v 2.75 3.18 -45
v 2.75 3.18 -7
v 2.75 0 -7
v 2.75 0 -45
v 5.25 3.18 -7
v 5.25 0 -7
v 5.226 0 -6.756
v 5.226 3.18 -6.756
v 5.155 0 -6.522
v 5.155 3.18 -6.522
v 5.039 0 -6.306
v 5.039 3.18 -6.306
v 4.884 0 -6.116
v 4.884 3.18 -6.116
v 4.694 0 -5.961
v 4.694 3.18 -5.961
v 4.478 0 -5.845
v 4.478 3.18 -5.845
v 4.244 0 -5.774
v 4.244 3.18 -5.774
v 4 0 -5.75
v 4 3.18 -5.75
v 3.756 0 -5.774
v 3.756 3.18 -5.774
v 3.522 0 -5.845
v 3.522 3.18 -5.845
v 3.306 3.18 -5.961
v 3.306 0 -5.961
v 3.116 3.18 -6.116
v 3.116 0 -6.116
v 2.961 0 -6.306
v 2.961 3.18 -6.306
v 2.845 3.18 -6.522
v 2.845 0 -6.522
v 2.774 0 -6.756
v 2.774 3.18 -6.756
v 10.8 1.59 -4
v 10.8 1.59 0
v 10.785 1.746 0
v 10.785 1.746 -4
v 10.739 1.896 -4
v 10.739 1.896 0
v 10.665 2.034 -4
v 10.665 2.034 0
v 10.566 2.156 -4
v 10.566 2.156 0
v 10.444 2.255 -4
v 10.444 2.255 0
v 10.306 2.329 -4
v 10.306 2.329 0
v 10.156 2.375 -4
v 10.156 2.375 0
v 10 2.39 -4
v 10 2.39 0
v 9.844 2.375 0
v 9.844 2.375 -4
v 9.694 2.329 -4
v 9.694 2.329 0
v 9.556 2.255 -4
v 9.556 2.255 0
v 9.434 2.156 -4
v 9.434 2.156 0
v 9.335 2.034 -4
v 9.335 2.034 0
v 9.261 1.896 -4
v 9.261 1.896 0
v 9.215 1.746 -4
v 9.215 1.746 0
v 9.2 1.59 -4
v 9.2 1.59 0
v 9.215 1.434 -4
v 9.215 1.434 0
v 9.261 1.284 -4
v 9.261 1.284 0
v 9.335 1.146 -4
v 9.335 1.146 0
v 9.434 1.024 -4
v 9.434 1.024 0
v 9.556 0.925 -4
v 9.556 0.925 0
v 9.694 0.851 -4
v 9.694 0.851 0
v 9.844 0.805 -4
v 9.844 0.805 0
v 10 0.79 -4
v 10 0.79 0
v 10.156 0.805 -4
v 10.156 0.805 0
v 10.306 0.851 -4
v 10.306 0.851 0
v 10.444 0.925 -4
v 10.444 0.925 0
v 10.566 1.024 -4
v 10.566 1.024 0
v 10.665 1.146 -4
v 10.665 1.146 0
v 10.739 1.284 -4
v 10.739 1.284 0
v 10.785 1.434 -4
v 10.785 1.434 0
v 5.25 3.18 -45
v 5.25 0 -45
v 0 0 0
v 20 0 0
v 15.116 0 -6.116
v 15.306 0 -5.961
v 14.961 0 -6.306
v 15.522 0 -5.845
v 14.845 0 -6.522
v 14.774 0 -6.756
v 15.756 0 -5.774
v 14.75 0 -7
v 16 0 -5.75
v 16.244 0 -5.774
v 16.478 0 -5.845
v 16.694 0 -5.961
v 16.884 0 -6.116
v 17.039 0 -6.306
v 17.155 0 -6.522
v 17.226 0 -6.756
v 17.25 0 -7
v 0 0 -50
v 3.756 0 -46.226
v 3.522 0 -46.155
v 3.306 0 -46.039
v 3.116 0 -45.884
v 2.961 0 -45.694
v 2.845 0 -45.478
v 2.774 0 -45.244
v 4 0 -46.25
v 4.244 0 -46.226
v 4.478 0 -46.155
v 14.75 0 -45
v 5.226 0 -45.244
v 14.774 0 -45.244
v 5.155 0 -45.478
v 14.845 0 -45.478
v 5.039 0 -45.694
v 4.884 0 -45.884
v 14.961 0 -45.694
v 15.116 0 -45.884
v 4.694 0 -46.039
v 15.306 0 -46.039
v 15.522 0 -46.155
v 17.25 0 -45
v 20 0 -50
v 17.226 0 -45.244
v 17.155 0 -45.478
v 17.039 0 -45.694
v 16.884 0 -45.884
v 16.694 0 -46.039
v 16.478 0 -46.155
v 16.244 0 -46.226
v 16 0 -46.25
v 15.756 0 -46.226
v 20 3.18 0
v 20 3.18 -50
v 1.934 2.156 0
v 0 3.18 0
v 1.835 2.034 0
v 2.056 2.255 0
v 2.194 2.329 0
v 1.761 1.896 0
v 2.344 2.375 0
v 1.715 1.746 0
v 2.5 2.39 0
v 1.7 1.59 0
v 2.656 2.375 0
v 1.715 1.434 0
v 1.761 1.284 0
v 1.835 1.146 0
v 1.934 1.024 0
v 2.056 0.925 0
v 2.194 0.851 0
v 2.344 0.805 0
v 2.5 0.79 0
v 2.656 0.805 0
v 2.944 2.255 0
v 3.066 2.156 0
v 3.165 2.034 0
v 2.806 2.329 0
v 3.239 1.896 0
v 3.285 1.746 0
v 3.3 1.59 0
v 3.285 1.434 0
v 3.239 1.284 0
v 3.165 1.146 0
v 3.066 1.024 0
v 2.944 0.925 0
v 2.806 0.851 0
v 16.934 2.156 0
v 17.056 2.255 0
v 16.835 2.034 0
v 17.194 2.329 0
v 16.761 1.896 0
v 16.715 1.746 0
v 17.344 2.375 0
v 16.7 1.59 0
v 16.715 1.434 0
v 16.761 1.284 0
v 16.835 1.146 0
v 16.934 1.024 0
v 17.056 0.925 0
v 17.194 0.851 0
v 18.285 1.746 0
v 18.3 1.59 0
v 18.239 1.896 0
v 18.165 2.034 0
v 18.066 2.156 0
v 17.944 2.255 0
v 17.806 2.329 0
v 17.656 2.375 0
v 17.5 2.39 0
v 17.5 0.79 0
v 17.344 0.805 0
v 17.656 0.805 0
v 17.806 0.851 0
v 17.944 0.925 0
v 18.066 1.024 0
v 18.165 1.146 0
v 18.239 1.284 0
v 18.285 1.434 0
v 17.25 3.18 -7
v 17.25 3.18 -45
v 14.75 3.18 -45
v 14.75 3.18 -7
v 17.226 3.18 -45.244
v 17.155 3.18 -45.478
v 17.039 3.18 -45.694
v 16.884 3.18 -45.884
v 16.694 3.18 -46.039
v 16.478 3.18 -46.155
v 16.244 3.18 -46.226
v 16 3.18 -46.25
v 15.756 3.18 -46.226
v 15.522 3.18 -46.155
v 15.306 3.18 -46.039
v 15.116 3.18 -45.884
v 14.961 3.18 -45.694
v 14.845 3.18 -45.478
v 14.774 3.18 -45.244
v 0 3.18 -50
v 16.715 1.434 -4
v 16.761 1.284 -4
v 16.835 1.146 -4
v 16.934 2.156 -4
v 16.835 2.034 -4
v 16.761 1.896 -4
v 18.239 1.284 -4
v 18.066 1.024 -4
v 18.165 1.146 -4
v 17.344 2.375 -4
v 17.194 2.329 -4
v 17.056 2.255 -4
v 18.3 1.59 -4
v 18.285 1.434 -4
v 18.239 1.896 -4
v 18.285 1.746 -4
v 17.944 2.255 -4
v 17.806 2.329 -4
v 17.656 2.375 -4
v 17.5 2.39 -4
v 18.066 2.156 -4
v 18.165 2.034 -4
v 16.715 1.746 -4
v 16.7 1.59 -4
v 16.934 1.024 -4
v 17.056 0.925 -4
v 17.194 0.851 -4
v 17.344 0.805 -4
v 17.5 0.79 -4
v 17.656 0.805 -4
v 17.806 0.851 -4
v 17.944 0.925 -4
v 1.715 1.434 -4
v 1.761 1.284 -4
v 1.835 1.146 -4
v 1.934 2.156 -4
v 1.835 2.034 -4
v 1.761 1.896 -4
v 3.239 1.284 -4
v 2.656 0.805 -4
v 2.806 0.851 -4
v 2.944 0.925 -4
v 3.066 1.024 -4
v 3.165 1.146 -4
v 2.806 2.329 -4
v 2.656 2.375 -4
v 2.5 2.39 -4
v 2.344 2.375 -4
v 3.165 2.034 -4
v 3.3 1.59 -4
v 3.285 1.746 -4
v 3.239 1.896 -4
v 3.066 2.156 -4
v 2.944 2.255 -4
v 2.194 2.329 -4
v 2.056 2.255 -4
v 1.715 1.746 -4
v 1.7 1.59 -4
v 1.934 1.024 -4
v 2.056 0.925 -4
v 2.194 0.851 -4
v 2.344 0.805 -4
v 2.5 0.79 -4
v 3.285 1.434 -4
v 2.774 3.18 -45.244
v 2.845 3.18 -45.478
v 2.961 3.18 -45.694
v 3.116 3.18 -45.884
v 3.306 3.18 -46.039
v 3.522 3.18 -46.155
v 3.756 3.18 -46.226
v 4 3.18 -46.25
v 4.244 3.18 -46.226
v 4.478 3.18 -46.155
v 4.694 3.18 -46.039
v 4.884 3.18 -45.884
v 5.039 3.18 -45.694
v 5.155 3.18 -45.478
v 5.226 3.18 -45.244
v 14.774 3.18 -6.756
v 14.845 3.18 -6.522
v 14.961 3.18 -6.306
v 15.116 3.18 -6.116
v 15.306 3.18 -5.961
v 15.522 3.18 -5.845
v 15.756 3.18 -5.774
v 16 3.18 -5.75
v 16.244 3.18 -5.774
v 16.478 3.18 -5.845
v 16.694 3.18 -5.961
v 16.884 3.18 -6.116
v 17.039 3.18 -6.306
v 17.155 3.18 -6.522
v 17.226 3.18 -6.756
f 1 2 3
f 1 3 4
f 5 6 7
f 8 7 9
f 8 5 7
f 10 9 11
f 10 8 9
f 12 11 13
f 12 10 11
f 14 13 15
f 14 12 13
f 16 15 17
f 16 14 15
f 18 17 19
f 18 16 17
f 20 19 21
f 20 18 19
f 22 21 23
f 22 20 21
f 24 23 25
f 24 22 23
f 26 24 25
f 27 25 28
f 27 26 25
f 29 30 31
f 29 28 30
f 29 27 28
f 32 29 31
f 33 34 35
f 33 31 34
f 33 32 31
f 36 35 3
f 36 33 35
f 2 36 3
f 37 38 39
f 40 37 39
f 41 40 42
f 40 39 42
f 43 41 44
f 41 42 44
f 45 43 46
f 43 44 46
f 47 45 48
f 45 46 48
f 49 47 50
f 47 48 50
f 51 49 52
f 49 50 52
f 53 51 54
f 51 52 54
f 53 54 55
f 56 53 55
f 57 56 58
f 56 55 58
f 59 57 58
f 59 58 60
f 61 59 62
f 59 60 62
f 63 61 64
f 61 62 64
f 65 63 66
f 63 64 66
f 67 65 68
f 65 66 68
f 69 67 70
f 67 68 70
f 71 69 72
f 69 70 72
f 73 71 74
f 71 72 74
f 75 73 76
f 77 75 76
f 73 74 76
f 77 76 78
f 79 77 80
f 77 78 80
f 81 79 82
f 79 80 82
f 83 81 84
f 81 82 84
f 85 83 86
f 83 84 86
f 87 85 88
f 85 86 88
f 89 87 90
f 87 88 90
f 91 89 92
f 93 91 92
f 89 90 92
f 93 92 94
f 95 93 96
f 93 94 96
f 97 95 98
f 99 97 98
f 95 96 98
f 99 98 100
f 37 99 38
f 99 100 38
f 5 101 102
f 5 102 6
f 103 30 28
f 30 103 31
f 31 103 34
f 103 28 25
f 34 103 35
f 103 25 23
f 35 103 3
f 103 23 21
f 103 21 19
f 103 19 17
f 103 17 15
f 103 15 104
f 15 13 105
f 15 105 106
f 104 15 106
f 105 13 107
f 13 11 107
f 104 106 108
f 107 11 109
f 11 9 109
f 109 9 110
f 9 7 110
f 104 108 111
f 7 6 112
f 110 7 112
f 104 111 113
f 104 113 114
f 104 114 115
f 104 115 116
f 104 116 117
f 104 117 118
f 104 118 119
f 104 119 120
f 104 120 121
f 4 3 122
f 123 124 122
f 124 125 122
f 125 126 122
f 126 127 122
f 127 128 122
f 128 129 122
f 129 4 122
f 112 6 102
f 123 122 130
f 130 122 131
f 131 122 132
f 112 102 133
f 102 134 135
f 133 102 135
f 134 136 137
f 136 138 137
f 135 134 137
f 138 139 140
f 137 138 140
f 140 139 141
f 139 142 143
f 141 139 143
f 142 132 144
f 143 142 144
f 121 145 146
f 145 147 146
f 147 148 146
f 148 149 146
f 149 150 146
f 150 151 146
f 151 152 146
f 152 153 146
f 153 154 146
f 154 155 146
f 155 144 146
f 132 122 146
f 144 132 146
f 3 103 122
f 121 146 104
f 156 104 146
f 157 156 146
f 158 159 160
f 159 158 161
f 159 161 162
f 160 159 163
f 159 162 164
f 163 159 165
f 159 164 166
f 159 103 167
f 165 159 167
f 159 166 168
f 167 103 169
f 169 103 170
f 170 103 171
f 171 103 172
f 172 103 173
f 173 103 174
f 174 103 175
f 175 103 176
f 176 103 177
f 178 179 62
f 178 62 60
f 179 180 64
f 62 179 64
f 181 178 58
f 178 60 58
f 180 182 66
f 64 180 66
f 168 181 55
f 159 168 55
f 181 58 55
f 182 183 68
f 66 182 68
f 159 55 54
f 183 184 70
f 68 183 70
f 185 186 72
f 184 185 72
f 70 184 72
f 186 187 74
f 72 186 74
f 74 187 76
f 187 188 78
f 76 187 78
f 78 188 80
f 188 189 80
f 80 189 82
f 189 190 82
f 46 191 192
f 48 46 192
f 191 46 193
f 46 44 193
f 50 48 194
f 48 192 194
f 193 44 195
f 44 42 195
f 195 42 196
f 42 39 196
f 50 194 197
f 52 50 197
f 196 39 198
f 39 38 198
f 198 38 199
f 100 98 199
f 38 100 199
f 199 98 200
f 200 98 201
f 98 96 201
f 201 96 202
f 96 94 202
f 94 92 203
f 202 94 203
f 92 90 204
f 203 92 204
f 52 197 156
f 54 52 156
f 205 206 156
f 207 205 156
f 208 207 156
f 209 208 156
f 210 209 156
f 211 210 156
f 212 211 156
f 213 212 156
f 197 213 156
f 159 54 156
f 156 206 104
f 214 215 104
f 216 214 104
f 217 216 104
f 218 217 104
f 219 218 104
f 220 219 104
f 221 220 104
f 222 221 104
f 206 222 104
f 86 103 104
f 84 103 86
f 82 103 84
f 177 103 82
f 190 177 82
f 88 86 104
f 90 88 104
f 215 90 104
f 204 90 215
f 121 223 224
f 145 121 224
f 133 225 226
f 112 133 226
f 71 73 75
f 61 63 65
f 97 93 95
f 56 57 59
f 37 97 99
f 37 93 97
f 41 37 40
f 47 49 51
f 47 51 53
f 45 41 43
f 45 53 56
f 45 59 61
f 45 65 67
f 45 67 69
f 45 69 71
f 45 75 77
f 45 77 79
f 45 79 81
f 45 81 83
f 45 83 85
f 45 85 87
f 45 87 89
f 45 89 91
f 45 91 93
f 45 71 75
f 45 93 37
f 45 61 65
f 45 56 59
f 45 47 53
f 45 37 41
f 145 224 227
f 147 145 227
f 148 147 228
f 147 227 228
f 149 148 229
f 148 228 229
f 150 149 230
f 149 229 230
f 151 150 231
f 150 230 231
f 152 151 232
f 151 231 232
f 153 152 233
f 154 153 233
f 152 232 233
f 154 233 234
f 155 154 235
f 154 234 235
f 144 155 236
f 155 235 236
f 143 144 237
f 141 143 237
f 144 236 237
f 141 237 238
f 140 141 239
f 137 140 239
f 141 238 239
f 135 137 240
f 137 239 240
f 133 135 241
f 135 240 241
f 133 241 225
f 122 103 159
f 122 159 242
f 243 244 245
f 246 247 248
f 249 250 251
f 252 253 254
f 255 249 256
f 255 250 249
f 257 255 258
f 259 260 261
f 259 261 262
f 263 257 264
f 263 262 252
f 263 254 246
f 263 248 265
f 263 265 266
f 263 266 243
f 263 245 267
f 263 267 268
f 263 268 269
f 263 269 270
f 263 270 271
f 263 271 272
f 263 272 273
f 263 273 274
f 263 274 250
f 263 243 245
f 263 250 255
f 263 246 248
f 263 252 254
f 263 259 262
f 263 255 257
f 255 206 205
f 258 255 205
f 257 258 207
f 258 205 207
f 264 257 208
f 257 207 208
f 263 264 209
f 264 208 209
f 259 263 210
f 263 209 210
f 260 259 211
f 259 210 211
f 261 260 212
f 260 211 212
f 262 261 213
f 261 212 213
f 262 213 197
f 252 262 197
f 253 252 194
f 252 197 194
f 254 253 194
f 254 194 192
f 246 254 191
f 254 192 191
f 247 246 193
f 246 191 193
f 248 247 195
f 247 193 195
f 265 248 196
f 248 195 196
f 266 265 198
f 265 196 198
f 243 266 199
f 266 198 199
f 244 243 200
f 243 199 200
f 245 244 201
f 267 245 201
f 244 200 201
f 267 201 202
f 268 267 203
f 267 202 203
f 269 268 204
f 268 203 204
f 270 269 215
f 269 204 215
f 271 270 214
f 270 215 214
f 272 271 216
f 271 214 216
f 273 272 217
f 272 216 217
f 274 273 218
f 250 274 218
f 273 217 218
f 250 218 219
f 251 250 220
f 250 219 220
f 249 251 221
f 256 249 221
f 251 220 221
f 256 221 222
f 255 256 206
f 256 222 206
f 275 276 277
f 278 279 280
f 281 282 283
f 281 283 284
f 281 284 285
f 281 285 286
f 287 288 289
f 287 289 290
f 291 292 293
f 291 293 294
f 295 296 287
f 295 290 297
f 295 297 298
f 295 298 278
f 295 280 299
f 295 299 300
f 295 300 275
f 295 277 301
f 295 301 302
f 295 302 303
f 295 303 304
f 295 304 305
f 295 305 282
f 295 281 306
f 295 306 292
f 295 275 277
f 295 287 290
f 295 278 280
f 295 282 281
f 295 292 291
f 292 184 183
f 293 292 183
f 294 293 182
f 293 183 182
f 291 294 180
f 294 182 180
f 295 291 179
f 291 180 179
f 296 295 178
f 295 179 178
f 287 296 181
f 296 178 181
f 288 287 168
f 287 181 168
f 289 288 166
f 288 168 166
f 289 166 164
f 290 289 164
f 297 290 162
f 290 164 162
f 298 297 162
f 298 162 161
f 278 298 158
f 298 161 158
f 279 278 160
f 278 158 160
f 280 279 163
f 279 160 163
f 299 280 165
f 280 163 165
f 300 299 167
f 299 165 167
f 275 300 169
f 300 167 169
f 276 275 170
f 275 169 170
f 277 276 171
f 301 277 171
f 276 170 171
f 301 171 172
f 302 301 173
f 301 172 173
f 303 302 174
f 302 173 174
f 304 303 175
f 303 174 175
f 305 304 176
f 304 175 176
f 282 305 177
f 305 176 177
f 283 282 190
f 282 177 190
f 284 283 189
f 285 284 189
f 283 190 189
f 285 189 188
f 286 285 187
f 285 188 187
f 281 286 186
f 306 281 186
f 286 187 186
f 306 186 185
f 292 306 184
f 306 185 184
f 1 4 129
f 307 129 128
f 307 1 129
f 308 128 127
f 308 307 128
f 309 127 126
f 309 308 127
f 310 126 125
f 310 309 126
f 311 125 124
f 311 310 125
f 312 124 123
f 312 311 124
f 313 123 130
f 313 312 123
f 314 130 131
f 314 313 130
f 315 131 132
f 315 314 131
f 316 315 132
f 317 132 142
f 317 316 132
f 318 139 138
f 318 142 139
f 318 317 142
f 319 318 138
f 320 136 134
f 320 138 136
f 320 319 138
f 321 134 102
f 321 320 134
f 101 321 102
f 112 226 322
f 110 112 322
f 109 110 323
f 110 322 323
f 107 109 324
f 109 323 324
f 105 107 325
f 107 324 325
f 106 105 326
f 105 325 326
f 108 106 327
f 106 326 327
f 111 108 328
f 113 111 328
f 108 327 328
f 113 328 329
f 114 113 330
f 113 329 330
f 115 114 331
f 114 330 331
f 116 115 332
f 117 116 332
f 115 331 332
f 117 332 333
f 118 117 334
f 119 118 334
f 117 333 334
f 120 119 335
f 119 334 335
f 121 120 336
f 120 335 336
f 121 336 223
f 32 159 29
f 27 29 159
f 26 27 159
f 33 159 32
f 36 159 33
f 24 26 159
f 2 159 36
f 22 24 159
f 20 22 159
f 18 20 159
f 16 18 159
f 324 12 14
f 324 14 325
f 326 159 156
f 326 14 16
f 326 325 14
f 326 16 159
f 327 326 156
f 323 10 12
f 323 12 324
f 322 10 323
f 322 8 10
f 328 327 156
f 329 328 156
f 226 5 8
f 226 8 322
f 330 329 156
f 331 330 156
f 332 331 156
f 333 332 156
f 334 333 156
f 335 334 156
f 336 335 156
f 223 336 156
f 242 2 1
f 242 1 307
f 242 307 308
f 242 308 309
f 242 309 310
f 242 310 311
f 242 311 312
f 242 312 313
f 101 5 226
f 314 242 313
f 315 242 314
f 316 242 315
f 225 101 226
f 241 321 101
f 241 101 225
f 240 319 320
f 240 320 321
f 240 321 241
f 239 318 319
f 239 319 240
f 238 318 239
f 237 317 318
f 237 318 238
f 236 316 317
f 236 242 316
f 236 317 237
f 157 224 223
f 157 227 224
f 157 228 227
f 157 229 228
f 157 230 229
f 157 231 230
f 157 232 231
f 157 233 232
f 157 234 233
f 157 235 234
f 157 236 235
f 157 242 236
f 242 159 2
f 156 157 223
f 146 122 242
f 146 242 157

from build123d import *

# Parameters (mm, degrees)
SKETCH1_W           = 20
SKETCH1_H           = 50
BOSS_EXTRUDE1_DEPTH = 3.18
CUT_EXTRUDE1_DEPTH  = 54.94545764
SKETCH3_R           = 0.8
CUT_EXTRUDE2_DEPTH  = 4


with BuildPart() as part:
    # Sketch1 → Boss-Extrude1 (new body)
    with BuildSketch(Plane(origin=(0, 0, 0), x_dir=(1, 0, 0), z_dir=(0, 1, 0))):
        with Locations((10, 25)):
            Rectangle(SKETCH1_W, SKETCH1_H)
    extrude(amount=BOSS_EXTRUDE1_DEPTH)

    # Sketch2 → Cut-Extrude1 (cut, through all)
    with BuildSketch(Plane(origin=(0, 3.18, 0), x_dir=(1, 0, 0), z_dir=(0, 1, 0))):
        with BuildLine():
            Line((2.75, 7), (2.75, 45))
            ThreePointArc((2.75, 45), (4, 46.25), (5.25, 45))
            Line((5.25, 45), (5.25, 7))
            ThreePointArc((5.25, 7), (4, 5.75), (2.75, 7))
        make_face()
    cut_extrude1 = extrude(amount=-CUT_EXTRUDE1_DEPTH, mode=Mode.SUBTRACT)

    # Mirror1: Cut-Extrude1 across plane
    add(cut_extrude1.mirror(Plane(origin=(10, 0, 0), x_dir=(0, 0, 1), z_dir=(1, 0, 0))), mode=Mode.SUBTRACT)

    # Sketch3 → Cut-Extrude2 (cut)
    with BuildSketch(Plane.XY):
        with Locations((10, 1.59)):
            Circle(SKETCH3_R)
        with Locations((2.5, 1.59)):
            Circle(SKETCH3_R)
        with Locations((17.5, 1.59)):
            Circle(SKETCH3_R)
    extrude(amount=-CUT_EXTRUDE2_DEPTH, mode=Mode.SUBTRACT)


solid = part.part
